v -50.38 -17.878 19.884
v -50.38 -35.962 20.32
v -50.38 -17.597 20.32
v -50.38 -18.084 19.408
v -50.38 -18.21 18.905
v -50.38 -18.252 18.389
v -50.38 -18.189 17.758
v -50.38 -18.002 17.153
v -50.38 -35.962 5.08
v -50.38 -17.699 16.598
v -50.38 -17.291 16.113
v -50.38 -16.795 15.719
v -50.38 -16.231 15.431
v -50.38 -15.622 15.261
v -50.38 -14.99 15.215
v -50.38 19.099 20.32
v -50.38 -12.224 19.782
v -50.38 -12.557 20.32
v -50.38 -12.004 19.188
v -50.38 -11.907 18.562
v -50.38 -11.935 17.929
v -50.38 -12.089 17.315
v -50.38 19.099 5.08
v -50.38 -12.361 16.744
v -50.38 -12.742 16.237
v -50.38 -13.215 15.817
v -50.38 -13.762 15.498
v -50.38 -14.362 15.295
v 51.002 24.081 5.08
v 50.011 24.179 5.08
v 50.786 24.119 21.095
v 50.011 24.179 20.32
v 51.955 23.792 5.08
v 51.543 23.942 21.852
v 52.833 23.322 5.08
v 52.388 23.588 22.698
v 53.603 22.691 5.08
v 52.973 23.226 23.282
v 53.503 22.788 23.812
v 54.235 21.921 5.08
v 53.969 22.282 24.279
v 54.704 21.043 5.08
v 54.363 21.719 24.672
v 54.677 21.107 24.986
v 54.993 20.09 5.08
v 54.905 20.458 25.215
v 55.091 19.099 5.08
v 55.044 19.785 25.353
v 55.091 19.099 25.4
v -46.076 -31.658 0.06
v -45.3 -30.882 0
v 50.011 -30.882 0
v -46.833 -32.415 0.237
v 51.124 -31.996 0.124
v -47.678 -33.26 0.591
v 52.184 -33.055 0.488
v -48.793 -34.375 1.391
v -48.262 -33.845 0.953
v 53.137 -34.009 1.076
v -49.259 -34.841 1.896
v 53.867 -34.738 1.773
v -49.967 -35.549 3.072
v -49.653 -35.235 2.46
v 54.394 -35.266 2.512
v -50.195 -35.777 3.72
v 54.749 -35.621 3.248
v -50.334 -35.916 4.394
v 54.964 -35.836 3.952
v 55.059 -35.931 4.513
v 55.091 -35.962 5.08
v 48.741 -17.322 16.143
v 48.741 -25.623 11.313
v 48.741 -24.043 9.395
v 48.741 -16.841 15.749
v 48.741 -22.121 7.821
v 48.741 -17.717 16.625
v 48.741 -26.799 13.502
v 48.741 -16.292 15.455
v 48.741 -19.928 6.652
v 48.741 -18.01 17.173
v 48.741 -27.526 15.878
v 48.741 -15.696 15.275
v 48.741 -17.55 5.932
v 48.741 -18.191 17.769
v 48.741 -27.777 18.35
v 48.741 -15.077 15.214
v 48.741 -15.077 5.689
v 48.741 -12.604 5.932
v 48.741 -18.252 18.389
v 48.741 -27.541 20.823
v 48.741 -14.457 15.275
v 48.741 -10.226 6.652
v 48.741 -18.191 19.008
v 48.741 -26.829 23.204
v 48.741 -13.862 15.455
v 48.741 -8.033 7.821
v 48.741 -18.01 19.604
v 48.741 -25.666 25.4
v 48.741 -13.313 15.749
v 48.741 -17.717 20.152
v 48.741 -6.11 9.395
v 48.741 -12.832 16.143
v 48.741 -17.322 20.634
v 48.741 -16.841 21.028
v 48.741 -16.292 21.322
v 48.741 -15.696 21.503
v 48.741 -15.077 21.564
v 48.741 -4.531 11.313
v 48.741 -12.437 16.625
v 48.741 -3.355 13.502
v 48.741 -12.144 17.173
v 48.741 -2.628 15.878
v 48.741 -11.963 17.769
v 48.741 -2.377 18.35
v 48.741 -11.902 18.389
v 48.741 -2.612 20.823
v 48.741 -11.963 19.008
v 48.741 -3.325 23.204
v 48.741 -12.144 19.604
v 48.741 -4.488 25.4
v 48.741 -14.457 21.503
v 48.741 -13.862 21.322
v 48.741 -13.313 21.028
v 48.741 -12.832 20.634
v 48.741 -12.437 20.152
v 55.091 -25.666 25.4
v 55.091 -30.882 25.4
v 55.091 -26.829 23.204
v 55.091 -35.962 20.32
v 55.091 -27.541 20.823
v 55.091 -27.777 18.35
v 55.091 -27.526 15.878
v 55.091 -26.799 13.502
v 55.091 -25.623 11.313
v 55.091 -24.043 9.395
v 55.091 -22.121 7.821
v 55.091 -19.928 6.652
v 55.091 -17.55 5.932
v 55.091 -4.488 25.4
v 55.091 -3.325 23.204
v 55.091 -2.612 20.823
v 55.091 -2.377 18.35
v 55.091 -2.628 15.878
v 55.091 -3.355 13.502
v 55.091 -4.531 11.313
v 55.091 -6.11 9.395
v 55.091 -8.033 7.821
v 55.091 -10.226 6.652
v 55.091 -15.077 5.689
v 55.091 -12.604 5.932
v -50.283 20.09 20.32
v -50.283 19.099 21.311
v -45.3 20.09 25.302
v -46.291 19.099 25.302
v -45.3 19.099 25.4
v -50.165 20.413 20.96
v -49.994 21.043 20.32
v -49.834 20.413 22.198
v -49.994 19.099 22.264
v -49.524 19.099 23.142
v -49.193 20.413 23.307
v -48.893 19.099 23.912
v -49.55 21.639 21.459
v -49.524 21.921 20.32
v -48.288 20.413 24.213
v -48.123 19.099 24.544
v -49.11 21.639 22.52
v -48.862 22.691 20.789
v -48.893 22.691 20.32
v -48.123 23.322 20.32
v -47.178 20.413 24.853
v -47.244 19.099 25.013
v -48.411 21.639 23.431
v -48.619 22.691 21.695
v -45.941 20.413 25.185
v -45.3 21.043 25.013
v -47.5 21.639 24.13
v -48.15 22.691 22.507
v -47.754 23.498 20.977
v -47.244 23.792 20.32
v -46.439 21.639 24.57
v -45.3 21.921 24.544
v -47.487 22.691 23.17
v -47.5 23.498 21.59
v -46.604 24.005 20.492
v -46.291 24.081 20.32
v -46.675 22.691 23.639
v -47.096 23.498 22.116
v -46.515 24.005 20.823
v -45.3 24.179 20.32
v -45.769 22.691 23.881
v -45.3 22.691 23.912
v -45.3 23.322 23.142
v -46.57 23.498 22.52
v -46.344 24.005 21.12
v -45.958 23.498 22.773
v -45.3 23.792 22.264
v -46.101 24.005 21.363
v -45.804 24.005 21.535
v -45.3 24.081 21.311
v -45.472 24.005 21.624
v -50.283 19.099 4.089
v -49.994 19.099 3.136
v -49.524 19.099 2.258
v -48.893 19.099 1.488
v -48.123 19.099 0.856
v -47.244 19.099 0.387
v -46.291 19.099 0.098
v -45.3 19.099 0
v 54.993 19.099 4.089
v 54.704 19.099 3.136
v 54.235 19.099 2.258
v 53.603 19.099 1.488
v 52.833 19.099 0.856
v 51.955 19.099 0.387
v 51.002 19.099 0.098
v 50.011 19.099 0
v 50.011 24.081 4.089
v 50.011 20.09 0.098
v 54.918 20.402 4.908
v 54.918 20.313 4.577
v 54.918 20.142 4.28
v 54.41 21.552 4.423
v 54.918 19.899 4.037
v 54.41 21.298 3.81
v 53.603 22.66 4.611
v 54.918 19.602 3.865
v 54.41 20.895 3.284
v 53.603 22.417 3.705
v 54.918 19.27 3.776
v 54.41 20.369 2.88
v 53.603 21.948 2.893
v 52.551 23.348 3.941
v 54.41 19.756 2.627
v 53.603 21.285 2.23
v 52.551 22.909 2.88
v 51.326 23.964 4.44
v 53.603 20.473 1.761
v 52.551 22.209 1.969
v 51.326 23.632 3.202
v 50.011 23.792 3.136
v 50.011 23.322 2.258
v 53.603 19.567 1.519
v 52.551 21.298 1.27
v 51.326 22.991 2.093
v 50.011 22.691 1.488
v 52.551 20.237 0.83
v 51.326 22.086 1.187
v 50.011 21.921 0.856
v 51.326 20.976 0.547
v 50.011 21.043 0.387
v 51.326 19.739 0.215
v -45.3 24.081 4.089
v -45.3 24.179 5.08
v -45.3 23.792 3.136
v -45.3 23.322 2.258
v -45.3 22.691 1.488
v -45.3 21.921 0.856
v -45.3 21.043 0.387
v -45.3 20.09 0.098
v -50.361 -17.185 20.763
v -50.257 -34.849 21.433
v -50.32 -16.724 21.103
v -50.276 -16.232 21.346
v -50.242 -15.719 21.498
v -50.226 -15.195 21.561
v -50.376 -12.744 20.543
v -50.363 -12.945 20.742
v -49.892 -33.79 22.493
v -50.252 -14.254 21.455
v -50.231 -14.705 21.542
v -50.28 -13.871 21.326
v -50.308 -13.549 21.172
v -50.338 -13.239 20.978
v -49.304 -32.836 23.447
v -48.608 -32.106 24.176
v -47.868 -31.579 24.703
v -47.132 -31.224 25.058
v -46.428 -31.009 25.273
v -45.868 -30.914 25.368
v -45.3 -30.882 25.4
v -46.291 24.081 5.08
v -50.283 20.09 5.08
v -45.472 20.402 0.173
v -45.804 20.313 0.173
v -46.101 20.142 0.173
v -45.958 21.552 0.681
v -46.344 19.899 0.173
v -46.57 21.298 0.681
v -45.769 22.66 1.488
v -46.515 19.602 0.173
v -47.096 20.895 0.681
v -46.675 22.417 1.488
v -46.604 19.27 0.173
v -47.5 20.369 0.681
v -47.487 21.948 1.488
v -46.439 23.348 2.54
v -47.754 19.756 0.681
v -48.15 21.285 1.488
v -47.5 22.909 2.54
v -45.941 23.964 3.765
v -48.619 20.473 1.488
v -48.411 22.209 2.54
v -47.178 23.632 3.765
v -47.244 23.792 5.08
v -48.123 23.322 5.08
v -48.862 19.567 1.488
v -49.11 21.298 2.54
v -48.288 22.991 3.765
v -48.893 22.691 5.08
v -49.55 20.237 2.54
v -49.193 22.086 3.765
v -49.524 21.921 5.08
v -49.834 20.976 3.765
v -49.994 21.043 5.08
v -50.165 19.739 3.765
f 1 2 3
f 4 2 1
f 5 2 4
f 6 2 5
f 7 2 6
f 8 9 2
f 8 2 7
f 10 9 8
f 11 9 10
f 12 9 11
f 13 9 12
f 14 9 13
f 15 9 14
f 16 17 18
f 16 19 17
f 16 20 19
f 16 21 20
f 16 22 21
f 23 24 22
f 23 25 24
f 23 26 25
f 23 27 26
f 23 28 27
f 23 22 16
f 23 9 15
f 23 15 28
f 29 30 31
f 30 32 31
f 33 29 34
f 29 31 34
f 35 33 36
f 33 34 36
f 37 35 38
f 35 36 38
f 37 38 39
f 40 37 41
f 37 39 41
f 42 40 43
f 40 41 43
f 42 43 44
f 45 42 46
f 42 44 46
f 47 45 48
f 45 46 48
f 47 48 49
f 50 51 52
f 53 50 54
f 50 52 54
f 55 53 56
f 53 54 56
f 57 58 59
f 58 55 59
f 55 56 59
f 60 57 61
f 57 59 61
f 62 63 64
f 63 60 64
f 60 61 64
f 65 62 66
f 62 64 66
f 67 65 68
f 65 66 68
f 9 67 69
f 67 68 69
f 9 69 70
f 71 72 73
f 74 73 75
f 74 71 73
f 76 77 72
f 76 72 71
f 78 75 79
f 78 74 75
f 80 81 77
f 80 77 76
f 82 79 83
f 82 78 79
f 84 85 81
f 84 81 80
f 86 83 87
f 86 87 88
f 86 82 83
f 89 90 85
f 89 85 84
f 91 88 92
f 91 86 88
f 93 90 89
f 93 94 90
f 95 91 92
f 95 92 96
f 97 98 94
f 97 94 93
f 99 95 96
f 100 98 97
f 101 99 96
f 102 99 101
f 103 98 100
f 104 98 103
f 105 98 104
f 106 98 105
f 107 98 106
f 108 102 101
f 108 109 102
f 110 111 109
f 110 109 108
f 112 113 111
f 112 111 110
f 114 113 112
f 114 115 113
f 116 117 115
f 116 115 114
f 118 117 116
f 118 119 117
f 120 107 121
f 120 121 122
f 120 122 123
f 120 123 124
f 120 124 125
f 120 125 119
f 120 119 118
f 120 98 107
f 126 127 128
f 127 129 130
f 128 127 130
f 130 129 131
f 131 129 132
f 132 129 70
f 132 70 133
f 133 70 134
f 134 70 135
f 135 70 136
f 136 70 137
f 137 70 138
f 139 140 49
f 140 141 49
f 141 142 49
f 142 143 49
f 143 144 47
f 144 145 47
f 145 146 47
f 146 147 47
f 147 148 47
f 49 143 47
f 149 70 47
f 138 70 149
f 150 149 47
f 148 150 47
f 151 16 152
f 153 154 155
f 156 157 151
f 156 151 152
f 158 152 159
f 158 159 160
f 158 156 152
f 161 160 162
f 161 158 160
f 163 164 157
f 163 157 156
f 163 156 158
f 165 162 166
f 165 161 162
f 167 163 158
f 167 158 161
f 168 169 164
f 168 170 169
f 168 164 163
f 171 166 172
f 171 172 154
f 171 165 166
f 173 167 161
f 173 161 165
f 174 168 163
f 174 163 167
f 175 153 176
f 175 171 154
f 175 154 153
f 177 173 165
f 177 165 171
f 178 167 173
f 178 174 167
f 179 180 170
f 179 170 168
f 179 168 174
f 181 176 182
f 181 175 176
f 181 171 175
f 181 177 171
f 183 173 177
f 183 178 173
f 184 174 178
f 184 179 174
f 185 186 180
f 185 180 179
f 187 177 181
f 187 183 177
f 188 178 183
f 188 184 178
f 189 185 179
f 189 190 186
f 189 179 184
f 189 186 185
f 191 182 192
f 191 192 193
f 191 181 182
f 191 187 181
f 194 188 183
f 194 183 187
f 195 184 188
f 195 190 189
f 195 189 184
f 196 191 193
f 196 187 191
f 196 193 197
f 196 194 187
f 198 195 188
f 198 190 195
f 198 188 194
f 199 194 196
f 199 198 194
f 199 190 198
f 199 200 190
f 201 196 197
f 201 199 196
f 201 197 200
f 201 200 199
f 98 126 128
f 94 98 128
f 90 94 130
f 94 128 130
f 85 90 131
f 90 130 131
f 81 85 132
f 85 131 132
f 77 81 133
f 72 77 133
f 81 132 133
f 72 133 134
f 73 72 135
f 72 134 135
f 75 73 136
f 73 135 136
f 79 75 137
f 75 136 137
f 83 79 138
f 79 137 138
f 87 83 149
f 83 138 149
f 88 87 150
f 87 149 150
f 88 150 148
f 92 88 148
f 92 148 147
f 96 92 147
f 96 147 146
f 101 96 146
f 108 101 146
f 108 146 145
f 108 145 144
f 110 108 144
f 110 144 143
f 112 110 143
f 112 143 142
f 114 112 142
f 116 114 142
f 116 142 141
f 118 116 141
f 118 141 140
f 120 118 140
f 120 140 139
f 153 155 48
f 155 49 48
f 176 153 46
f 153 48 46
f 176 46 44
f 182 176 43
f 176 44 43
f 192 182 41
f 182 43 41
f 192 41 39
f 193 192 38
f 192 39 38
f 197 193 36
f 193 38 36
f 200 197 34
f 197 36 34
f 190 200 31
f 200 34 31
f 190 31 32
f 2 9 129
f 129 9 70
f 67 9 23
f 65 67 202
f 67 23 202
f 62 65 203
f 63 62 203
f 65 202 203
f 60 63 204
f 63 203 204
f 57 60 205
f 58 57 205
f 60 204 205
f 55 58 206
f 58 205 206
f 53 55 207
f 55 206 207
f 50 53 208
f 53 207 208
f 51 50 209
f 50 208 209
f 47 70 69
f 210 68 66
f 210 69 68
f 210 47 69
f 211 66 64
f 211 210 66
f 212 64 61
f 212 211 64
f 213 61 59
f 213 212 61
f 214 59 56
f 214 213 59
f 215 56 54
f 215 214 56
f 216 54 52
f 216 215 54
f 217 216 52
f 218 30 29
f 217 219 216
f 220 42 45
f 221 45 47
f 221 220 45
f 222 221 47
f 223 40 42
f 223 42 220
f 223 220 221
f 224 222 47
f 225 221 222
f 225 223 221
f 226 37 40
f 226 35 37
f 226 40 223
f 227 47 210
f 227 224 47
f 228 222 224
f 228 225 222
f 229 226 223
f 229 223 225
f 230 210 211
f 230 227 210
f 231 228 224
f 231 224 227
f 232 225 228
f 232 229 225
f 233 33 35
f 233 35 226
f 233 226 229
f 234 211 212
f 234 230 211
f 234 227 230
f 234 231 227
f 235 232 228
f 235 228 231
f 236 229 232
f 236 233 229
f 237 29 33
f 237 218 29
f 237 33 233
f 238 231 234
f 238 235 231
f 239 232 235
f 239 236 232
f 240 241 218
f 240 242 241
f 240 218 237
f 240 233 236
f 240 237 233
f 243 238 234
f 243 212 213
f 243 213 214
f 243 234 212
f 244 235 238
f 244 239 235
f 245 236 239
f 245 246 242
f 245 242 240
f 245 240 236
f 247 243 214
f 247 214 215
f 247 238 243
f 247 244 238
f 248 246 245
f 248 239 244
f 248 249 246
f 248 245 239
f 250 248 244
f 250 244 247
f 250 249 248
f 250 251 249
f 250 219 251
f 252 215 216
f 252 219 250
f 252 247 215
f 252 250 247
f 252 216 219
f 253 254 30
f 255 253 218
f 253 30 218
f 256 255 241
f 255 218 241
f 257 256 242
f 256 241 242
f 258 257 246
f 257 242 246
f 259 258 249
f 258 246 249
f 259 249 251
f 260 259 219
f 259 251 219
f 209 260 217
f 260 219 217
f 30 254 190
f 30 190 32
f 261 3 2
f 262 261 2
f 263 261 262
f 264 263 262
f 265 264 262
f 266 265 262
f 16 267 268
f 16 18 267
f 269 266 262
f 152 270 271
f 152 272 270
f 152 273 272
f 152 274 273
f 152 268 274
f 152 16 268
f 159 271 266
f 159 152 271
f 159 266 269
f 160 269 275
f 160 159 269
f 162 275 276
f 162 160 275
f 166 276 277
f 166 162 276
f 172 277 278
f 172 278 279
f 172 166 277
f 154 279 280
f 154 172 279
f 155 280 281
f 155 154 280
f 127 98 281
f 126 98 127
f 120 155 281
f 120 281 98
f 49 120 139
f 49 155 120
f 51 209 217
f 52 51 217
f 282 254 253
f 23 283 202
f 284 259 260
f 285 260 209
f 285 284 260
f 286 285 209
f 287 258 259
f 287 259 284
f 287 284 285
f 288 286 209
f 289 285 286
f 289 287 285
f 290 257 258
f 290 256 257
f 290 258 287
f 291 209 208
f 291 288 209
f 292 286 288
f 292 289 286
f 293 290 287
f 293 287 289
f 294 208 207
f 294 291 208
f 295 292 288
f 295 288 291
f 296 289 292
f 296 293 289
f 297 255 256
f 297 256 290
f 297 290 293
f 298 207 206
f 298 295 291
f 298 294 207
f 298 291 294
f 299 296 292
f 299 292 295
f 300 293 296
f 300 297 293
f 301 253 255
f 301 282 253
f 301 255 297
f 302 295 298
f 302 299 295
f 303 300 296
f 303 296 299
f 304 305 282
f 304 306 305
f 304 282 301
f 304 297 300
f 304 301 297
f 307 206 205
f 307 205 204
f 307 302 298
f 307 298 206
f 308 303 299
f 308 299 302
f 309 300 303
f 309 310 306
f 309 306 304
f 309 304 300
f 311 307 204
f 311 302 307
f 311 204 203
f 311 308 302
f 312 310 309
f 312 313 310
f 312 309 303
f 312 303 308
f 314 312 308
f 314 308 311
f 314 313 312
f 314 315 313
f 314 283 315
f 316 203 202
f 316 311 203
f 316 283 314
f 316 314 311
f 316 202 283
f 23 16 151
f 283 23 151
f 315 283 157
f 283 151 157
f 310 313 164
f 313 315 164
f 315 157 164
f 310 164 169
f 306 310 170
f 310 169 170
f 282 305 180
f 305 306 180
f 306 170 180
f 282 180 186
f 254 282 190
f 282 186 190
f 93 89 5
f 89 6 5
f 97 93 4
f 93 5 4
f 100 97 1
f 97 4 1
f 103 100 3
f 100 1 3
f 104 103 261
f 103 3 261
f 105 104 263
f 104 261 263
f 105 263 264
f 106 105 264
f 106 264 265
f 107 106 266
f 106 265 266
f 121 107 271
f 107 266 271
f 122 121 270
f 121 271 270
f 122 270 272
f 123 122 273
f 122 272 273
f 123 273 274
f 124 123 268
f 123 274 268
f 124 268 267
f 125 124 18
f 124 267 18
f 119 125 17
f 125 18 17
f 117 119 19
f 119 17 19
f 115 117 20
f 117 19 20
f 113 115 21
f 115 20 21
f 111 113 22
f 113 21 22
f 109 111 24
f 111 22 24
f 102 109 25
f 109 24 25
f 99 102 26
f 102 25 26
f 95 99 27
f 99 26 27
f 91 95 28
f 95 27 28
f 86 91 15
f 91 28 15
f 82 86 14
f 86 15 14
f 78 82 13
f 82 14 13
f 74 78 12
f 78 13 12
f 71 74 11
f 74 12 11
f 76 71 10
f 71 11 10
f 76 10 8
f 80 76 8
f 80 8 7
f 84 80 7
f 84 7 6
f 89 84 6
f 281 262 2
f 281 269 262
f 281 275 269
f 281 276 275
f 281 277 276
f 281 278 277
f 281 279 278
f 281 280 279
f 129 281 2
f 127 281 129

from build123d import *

# Parameters (mm, degrees)
F0_W           = 105.471175
F0_H           = 60.14101
F1_DEPTH       = 25.4
F2_SIZE        = 5.08
F3_R           = 5.08
F5_D           = 6.35
F5_CBORE_D     = 25.4
F5_CBORE_DEPTH = 6.35
F6_R           = 5.08


with BuildPart() as f1:
    # F0 (on Top) → F1 (new body)
    with BuildSketch(Plane.XY):
        with Locations((2.355178, -5.891924)):
            Rectangle(F0_W, F0_H)
    extrude(amount=F1_DEPTH)

    # F2
    f2_edges = [f1.edges().sort_by_distance(p)[0] for p in [
        (2.355179, -35.962429, 25.4),
    ]]
    chamfer(f2_edges, length=F2_SIZE)

    # F3
    f3_edges = [f1.edges().sort_by_distance(p)[0] for p in [
        (-50.380409, -3.351924, 25.4),
    ]]
    fillet(f3_edges, radius=F3_R)

    # F5 (through all)
    with Locations(Plane.YZ.offset(55.090766)):
        with Locations((-15.076851, 18.388513)):
            CounterBoreHole(F5_D / 2, F5_CBORE_D / 2, F5_CBORE_DEPTH)

    # F6
    f6_edges = [f1.edges().sort_by_distance(p)[0] for p in [
        (-50.380409, 24.178581, 10.16),
        (-48.892511, 24.178581, 23.912102),
        (2.355179, 24.178581, 0),
        (4.895179, 24.178581, 25.4),
        (55.090766, 24.178581, 12.7),
        (-50.380409, -5.891924, 0),
        (2.355179, -35.962429, 0),
        (55.090766, -5.891924, 0),
    ]]
    fillet(f6_edges, radius=F6_R)


solid = f1.part
